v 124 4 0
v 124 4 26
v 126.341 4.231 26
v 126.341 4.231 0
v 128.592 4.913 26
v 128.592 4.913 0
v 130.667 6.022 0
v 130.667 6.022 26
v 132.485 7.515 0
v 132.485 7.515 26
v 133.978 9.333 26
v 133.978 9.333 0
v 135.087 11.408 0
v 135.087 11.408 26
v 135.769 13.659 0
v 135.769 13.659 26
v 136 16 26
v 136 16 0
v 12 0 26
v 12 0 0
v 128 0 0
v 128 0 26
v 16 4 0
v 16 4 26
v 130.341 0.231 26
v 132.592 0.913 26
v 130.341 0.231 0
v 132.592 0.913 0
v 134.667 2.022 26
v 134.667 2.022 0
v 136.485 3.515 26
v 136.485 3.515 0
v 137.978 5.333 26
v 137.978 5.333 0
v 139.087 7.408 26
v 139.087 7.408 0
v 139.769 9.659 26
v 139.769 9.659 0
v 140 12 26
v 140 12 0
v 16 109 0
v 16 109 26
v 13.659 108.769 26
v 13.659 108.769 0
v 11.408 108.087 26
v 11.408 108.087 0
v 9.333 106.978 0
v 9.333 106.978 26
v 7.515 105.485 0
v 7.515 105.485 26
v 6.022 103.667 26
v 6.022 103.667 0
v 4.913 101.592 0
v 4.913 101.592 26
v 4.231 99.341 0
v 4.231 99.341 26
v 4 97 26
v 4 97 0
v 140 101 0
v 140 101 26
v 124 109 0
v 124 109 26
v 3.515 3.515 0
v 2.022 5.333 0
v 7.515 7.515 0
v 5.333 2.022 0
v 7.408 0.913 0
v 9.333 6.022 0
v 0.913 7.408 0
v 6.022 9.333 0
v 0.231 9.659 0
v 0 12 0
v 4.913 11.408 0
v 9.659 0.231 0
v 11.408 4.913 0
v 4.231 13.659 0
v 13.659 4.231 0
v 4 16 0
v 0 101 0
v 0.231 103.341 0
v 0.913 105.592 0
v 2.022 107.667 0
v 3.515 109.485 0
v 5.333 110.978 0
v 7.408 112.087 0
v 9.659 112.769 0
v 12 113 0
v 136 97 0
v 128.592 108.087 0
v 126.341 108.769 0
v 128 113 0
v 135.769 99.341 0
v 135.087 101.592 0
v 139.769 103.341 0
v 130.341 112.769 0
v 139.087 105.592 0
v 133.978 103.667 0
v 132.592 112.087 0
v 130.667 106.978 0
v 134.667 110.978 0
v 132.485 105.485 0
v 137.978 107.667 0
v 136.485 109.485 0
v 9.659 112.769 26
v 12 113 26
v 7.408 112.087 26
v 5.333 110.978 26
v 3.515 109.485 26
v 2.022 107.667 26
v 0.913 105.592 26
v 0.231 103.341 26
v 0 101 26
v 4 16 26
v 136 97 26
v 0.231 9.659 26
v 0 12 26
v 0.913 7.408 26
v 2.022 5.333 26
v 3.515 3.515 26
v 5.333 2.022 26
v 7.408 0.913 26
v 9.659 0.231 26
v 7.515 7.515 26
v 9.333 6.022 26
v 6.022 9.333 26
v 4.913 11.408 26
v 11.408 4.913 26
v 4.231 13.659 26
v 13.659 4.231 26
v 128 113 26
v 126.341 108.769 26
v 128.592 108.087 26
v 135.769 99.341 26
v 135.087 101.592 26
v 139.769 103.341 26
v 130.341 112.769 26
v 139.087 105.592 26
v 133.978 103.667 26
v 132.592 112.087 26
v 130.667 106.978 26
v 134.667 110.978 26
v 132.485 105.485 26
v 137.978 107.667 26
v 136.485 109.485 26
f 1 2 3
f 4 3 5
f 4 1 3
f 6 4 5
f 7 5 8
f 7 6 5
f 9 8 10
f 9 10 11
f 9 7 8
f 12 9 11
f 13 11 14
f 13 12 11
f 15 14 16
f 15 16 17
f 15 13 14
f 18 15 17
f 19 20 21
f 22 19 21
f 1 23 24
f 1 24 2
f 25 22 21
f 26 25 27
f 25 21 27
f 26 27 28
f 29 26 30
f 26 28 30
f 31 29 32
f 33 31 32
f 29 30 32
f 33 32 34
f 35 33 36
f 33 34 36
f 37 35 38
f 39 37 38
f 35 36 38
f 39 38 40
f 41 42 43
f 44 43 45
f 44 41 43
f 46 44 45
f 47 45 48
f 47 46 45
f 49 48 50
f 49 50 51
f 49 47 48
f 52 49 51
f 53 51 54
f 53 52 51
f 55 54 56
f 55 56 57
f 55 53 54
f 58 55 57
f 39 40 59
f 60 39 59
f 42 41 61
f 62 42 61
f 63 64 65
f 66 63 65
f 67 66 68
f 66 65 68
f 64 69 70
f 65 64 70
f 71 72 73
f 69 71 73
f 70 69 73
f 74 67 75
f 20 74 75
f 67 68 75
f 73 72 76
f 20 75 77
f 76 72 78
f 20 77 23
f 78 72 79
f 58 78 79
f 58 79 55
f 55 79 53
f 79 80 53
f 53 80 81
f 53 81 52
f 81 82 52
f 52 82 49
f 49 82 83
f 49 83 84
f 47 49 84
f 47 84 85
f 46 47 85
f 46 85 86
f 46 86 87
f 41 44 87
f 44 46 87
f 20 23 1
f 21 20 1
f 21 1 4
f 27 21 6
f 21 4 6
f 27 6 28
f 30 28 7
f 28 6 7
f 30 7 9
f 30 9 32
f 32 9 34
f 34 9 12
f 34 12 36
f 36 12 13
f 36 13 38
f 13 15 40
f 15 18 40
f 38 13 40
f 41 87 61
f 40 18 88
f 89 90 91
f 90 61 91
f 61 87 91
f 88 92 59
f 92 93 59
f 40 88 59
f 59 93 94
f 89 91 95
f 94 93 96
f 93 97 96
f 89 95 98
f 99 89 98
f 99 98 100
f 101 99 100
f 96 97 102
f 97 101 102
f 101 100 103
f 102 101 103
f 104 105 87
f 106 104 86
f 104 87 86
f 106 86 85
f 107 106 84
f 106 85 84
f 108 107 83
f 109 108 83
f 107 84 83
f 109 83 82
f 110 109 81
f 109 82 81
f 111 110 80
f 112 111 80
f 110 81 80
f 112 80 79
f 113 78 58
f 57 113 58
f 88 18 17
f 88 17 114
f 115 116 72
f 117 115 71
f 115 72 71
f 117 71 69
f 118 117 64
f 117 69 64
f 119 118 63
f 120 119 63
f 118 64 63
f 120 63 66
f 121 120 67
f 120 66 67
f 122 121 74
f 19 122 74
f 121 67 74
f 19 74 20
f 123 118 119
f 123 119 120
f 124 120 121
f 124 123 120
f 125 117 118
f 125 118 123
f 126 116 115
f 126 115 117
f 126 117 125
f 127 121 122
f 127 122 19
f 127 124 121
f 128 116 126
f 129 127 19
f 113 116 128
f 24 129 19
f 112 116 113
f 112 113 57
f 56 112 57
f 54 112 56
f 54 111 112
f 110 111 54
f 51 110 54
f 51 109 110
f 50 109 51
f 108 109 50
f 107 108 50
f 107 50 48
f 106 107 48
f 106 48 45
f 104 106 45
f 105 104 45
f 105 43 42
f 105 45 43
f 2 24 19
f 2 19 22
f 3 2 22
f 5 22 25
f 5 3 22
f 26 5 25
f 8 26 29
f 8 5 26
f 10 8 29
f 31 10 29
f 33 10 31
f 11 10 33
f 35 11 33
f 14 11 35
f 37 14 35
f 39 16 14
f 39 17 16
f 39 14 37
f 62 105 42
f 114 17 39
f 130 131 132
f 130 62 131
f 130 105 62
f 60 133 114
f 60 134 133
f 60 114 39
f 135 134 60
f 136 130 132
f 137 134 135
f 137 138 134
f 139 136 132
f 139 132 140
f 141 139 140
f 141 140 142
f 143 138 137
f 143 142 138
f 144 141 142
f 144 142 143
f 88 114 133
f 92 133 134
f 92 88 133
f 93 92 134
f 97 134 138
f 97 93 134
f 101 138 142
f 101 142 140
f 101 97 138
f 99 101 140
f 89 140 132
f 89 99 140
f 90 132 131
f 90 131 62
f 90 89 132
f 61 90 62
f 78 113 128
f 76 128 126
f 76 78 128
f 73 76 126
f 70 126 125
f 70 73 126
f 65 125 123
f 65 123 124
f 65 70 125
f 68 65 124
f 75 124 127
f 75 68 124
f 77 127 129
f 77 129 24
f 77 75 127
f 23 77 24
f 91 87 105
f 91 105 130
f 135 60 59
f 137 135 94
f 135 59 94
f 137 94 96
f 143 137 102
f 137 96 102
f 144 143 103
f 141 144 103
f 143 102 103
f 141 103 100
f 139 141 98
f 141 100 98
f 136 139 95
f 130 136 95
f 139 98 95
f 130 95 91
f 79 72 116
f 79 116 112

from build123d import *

# Parameters (mm, degrees)
CYLINDER086_R          = 12
CYLINDER086_DEPTH      = 26
BOX065_W               = 12
BOX065_H               = 12
BOX065_DEPTH           = 26
CYLINDER087_R          = 12
CYLINDER087_DEPTH      = 26
BOX066_W               = 12
BOX066_H               = 12
BOX066_DEPTH           = 26
CUT039_PLACEMENT_ANGLE = 90
CYLINDER088_R          = 12
CYLINDER088_DEPTH      = 26
BOX067_W               = 12
BOX067_H               = 12
BOX067_DEPTH           = 26
CUT040_PLACEMENT_ANGLE = 180
CYLINDER089_R          = 12
CYLINDER089_DEPTH      = 26
BOX068_W               = 12
BOX068_H               = 12
BOX068_DEPTH           = 26
CUT041_PLACEMENT_ANGLE = 90
BOX064_W               = 132
BOX064_H               = 105
BOX064_DEPTH           = 26
CYLINDER082_R          = 12
CYLINDER082_DEPTH      = 26
BOX060_W               = 12
BOX060_H               = 12
BOX060_DEPTH           = 26
CYLINDER083_R          = 12
CYLINDER083_DEPTH      = 26
BOX061_W               = 12
BOX061_H               = 12
BOX061_DEPTH           = 26
CUT034_PLACEMENT_ANGLE = 90
CYLINDER084_R          = 12
CYLINDER084_DEPTH      = 26
BOX062_W               = 12
BOX062_H               = 12
BOX062_DEPTH           = 26
CUT035_PLACEMENT_ANGLE = 180
CYLINDER085_R          = 12
CYLINDER085_DEPTH      = 26
BOX063_W               = 12
BOX063_H               = 12
BOX063_DEPTH           = 26
CUT036_PLACEMENT_ANGLE = 90
BOX059_W               = 140
BOX059_H               = 113
BOX059_DEPTH           = 26


with BuildPart() as cylinder088:
    # Cylinder086 → Cylinder086 (new body)
    with BuildSketch(Plane(origin=(12, 12, 0), x_dir=(1, 0, 0), z_dir=(0, 0, 1))):
        Circle(CYLINDER086_R)
    extrude(amount=CYLINDER086_DEPTH)


with BuildPart() as cutout014:
    # Box065 → Box065 (new body)
    with BuildSketch(Plane.XY):
        with Locations((6, 6)):
            Rectangle(BOX065_W, BOX065_H)
    extrude(amount=BOX065_DEPTH)

    # Cut038: cut Cylinder088
    add(cylinder088.part, mode=Mode.SUBTRACT)


with BuildPart() as cutout014_1:
    # Cut038 placement: moved
    add(cutout014.part.moved(Location((4, 4, 0))))


with BuildPart() as cylinder089:
    # Cylinder087 → Cylinder087 (new body)
    with BuildSketch(Plane(origin=(12, 12, 0), x_dir=(1, 0, 0), z_dir=(0, 0, 1))):
        Circle(CYLINDER087_R)
    extrude(amount=CYLINDER087_DEPTH)


with BuildPart() as cutout015:
    # Box066 → Box066 (new body)
    with BuildSketch(Plane.XY):
        with Locations((6, 6)):
            Rectangle(BOX066_W, BOX066_H)
    extrude(amount=BOX066_DEPTH)

    # Cut039: cut Cylinder089
    add(cylinder089.part, mode=Mode.SUBTRACT)


with BuildPart() as cutout015_1:
    # Cut039 placement: moved
    add(cutout015.part.moved(Location((136, 4, 0))).rotate(Axis((136, 4, 0), (0, 0, 1)), CUT039_PLACEMENT_ANGLE))


with BuildPart() as cylinder090:
    # Cylinder088 → Cylinder088 (new body)
    with BuildSketch(Plane(origin=(12, 12, 0), x_dir=(1, 0, 0), z_dir=(0, 0, 1))):
        Circle(CYLINDER088_R)
    extrude(amount=CYLINDER088_DEPTH)


with BuildPart() as cutout016:
    # Box067 → Box067 (new body)
    with BuildSketch(Plane.XY):
        with Locations((6, 6)):
            Rectangle(BOX067_W, BOX067_H)
    extrude(amount=BOX067_DEPTH)

    # Cut040: cut Cylinder090
    add(cylinder090.part, mode=Mode.SUBTRACT)


with BuildPart() as cutout016_1:
    # Cut040 placement: moved
    add(cutout016.part.moved(Location((136, 109, 0))).rotate(Axis((136, 109, 0), (0, 0, 1)), CUT040_PLACEMENT_ANGLE))


with BuildPart() as cylinder091:
    # Cylinder089 → Cylinder089 (new body)
    with BuildSketch(Plane(origin=(12, 12, 0), x_dir=(1, 0, 0), z_dir=(0, 0, 1))):
        Circle(CYLINDER089_R)
    extrude(amount=CYLINDER089_DEPTH)


with BuildPart() as cuts003:
    # Box068 → Box068 (new body)
    with BuildSketch(Plane.XY):
        with Locations((6, 6)):
            Rectangle(BOX068_W, BOX068_H)
    extrude(amount=BOX068_DEPTH)

    # Cut041: cut Cylinder091
    add(cylinder091.part, mode=Mode.SUBTRACT)


with BuildPart() as cuts003_1:
    # Cut041 placement: moved
    add(cuts003.part.moved(Location((4, 109, 0))).rotate(Axis((4, 109, 0), (0, 0, -1)), CUT041_PLACEMENT_ANGLE))

    # Fusion043: union cutOut014, cutOut015, cutOut016
    add(cutout014_1.part)
    add(cutout015_1.part)
    add(cutout016_1.part)


with BuildPart() as wallcut:
    # Box064 → Box064 (new body)
    with BuildSketch(Plane(origin=(4, 4, 0), x_dir=(1, 0, 0), z_dir=(0, 0, 1))):
        with Locations((66, 52.5)):
            Rectangle(BOX064_W, BOX064_H)
    extrude(amount=BOX064_DEPTH)

    # Cut042: cut cuts003
    add(cuts003_1.part, mode=Mode.SUBTRACT)


with BuildPart() as cylinder084:
    # Cylinder082 → Cylinder082 (new body)
    with BuildSketch(Plane(origin=(12, 12, 0), x_dir=(1, 0, 0), z_dir=(0, 0, 1))):
        Circle(CYLINDER082_R)
    extrude(amount=CYLINDER082_DEPTH)


with BuildPart() as cutout010:
    # Box060 → Box060 (new body)
    with BuildSketch(Plane.XY):
        with Locations((6, 6)):
            Rectangle(BOX060_W, BOX060_H)
    extrude(amount=BOX060_DEPTH)

    # Cut033: cut Cylinder084
    add(cylinder084.part, mode=Mode.SUBTRACT)


with BuildPart() as cylinder085:
    # Cylinder083 → Cylinder083 (new body)
    with BuildSketch(Plane(origin=(12, 12, 0), x_dir=(1, 0, 0), z_dir=(0, 0, 1))):
        Circle(CYLINDER083_R)
    extrude(amount=CYLINDER083_DEPTH)


with BuildPart() as cutout011:
    # Box061 → Box061 (new body)
    with BuildSketch(Plane.XY):
        with Locations((6, 6)):
            Rectangle(BOX061_W, BOX061_H)
    extrude(amount=BOX061_DEPTH)

    # Cut034: cut Cylinder085
    add(cylinder085.part, mode=Mode.SUBTRACT)


with BuildPart() as cutout011_1:
    # Cut034 placement: moved
    add(cutout011.part.moved(Location((140, 0, 0))).rotate(Axis((140, 0, 0), (0, 0, 1)), CUT034_PLACEMENT_ANGLE))


with BuildPart() as cylinder086:
    # Cylinder084 → Cylinder084 (new body)
    with BuildSketch(Plane(origin=(12, 12, 0), x_dir=(1, 0, 0), z_dir=(0, 0, 1))):
        Circle(CYLINDER084_R)
    extrude(amount=CYLINDER084_DEPTH)


with BuildPart() as cutout012:
    # Box062 → Box062 (new body)
    with BuildSketch(Plane.XY):
        with Locations((6, 6)):
            Rectangle(BOX062_W, BOX062_H)
    extrude(amount=BOX062_DEPTH)

    # Cut035: cut Cylinder086
    add(cylinder086.part, mode=Mode.SUBTRACT)


with BuildPart() as cutout012_1:
    # Cut035 placement: moved
    add(cutout012.part.moved(Location((140, 113, 0))).rotate(Axis((140, 113, 0), (0, 0, 1)), CUT035_PLACEMENT_ANGLE))


with BuildPart() as cylinder087:
    # Cylinder085 → Cylinder085 (new body)
    with BuildSketch(Plane(origin=(12, 12, 0), x_dir=(1, 0, 0), z_dir=(0, 0, 1))):
        Circle(CYLINDER085_R)
    extrude(amount=CYLINDER085_DEPTH)


with BuildPart() as cuts002:
    # Box063 → Box063 (new body)
    with BuildSketch(Plane.XY):
        with Locations((6, 6)):
            Rectangle(BOX063_W, BOX063_H)
    extrude(amount=BOX063_DEPTH)

    # Cut036: cut Cylinder087
    add(cylinder087.part, mode=Mode.SUBTRACT)


with BuildPart() as cuts002_1:
    # Cut036 placement: moved
    add(cuts002.part.moved(Location((0, 113, 0))).rotate(Axis((0, 113, 0), (0, 0, -1)), CUT036_PLACEMENT_ANGLE))

    # Fusion042: union cutOut010, cutOut011, cutOut012
    add(cutout010.part)
    add(cutout011_1.part)
    add(cutout012_1.part)


with BuildPart() as wall001:
    # Box059 → Box059 (new body)
    with BuildSketch(Plane.XY):
        with Locations((70, 56.5)):
            Rectangle(BOX059_W, BOX059_H)
    extrude(amount=BOX059_DEPTH)

    # Cut037: cut cuts002
    add(cuts002_1.part, mode=Mode.SUBTRACT)

    # Cut043: cut wallCut
    add(wallcut.part, mode=Mode.SUBTRACT)


solid = wall001.part
